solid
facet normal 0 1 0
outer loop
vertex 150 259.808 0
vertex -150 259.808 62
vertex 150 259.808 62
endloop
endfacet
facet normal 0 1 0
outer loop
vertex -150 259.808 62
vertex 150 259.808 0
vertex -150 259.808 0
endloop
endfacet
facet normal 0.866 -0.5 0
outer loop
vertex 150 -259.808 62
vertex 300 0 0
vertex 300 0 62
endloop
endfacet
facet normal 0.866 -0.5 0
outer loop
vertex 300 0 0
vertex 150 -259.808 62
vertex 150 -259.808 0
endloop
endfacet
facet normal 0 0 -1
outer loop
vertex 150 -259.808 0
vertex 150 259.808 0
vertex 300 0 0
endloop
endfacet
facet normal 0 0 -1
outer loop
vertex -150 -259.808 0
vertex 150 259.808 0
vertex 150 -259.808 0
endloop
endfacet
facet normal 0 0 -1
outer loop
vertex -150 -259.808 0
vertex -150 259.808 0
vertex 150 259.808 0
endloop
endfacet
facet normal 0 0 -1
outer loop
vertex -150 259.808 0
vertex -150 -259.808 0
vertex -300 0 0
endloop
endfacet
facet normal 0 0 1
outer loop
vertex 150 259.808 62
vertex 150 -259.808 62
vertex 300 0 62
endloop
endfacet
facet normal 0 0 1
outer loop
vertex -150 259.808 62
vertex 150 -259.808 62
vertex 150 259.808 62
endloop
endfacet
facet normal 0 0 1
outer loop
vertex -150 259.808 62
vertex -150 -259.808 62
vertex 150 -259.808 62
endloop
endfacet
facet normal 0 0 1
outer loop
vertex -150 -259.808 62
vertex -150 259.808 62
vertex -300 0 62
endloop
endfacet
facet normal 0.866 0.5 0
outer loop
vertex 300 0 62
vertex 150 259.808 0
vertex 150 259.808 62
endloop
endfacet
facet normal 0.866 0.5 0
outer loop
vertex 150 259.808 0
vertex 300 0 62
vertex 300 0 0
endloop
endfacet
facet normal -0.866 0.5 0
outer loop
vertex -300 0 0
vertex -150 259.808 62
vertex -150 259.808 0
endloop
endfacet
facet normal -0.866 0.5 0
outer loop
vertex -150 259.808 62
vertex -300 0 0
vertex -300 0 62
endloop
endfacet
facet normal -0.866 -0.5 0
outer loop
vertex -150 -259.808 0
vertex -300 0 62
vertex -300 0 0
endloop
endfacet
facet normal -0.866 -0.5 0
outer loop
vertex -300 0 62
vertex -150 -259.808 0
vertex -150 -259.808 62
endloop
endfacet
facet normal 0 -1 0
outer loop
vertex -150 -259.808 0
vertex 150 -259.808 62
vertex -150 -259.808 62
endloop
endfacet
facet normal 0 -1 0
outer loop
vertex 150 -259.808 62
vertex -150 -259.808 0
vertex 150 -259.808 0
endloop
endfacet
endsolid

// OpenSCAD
// resolution bezier curve
deltat = 0.004;

// cubic bexier curve function
function cubic_bezier(p0,p1,p2,p3) = [for (t=[0:deltat:1+deltat]) pow(1-t,3)*p0+3*pow((1-t),2)*t*p1+3*(1-t)*pow(t,2)*p2+pow(t,3)*p3];
    
function reverse(v) = [for (i=[len(v)-1:-1:0]) v[i]];
function delete_first(v) = [for (i=[1:len(v)-1]) v[i]]; 

// cubic bezier curve for canal shape 
p10 = [-75, 63];
p11 = [-30, 63];
p12 = [-60, 18];
p13 = [0, 18];

p20 = [75, 63];
p21 = [30, 63];
p22 = [60, 18];
p23 = [0, 18];

// bezier curve
points_left = cubic_bezier(p10, p11, p12, p13);
points_right = reverse(cubic_bezier(p20, p21, p22, p23));
points = concat(points_left, points_right);


difference()
{
    
    // hexagon base
    color("Peru", 1.0)
    {
        linear_extrude(height = 62, center = false, convexity = 10, twist = 0)
        circle(300, $fn=6);
    }
    
    color("DodgerBlue", 1.0)
    {
        union()
        {
            tx=450;
            ty=259.8;
            // canal shape
            translate([-tx, -ty, 0])
            rotate_extrude(angle=360, convexity=10, $fn=90)
            translate([-tx, 0, -ty])
            polygon(points);
            
            // canal shape
            translate([tx, -ty, 0])
            rotate_extrude(angle=360, convexity=10, $fn=90)
            translate([tx, 0, -ty])
            polygon(points);
        }
    }
}
